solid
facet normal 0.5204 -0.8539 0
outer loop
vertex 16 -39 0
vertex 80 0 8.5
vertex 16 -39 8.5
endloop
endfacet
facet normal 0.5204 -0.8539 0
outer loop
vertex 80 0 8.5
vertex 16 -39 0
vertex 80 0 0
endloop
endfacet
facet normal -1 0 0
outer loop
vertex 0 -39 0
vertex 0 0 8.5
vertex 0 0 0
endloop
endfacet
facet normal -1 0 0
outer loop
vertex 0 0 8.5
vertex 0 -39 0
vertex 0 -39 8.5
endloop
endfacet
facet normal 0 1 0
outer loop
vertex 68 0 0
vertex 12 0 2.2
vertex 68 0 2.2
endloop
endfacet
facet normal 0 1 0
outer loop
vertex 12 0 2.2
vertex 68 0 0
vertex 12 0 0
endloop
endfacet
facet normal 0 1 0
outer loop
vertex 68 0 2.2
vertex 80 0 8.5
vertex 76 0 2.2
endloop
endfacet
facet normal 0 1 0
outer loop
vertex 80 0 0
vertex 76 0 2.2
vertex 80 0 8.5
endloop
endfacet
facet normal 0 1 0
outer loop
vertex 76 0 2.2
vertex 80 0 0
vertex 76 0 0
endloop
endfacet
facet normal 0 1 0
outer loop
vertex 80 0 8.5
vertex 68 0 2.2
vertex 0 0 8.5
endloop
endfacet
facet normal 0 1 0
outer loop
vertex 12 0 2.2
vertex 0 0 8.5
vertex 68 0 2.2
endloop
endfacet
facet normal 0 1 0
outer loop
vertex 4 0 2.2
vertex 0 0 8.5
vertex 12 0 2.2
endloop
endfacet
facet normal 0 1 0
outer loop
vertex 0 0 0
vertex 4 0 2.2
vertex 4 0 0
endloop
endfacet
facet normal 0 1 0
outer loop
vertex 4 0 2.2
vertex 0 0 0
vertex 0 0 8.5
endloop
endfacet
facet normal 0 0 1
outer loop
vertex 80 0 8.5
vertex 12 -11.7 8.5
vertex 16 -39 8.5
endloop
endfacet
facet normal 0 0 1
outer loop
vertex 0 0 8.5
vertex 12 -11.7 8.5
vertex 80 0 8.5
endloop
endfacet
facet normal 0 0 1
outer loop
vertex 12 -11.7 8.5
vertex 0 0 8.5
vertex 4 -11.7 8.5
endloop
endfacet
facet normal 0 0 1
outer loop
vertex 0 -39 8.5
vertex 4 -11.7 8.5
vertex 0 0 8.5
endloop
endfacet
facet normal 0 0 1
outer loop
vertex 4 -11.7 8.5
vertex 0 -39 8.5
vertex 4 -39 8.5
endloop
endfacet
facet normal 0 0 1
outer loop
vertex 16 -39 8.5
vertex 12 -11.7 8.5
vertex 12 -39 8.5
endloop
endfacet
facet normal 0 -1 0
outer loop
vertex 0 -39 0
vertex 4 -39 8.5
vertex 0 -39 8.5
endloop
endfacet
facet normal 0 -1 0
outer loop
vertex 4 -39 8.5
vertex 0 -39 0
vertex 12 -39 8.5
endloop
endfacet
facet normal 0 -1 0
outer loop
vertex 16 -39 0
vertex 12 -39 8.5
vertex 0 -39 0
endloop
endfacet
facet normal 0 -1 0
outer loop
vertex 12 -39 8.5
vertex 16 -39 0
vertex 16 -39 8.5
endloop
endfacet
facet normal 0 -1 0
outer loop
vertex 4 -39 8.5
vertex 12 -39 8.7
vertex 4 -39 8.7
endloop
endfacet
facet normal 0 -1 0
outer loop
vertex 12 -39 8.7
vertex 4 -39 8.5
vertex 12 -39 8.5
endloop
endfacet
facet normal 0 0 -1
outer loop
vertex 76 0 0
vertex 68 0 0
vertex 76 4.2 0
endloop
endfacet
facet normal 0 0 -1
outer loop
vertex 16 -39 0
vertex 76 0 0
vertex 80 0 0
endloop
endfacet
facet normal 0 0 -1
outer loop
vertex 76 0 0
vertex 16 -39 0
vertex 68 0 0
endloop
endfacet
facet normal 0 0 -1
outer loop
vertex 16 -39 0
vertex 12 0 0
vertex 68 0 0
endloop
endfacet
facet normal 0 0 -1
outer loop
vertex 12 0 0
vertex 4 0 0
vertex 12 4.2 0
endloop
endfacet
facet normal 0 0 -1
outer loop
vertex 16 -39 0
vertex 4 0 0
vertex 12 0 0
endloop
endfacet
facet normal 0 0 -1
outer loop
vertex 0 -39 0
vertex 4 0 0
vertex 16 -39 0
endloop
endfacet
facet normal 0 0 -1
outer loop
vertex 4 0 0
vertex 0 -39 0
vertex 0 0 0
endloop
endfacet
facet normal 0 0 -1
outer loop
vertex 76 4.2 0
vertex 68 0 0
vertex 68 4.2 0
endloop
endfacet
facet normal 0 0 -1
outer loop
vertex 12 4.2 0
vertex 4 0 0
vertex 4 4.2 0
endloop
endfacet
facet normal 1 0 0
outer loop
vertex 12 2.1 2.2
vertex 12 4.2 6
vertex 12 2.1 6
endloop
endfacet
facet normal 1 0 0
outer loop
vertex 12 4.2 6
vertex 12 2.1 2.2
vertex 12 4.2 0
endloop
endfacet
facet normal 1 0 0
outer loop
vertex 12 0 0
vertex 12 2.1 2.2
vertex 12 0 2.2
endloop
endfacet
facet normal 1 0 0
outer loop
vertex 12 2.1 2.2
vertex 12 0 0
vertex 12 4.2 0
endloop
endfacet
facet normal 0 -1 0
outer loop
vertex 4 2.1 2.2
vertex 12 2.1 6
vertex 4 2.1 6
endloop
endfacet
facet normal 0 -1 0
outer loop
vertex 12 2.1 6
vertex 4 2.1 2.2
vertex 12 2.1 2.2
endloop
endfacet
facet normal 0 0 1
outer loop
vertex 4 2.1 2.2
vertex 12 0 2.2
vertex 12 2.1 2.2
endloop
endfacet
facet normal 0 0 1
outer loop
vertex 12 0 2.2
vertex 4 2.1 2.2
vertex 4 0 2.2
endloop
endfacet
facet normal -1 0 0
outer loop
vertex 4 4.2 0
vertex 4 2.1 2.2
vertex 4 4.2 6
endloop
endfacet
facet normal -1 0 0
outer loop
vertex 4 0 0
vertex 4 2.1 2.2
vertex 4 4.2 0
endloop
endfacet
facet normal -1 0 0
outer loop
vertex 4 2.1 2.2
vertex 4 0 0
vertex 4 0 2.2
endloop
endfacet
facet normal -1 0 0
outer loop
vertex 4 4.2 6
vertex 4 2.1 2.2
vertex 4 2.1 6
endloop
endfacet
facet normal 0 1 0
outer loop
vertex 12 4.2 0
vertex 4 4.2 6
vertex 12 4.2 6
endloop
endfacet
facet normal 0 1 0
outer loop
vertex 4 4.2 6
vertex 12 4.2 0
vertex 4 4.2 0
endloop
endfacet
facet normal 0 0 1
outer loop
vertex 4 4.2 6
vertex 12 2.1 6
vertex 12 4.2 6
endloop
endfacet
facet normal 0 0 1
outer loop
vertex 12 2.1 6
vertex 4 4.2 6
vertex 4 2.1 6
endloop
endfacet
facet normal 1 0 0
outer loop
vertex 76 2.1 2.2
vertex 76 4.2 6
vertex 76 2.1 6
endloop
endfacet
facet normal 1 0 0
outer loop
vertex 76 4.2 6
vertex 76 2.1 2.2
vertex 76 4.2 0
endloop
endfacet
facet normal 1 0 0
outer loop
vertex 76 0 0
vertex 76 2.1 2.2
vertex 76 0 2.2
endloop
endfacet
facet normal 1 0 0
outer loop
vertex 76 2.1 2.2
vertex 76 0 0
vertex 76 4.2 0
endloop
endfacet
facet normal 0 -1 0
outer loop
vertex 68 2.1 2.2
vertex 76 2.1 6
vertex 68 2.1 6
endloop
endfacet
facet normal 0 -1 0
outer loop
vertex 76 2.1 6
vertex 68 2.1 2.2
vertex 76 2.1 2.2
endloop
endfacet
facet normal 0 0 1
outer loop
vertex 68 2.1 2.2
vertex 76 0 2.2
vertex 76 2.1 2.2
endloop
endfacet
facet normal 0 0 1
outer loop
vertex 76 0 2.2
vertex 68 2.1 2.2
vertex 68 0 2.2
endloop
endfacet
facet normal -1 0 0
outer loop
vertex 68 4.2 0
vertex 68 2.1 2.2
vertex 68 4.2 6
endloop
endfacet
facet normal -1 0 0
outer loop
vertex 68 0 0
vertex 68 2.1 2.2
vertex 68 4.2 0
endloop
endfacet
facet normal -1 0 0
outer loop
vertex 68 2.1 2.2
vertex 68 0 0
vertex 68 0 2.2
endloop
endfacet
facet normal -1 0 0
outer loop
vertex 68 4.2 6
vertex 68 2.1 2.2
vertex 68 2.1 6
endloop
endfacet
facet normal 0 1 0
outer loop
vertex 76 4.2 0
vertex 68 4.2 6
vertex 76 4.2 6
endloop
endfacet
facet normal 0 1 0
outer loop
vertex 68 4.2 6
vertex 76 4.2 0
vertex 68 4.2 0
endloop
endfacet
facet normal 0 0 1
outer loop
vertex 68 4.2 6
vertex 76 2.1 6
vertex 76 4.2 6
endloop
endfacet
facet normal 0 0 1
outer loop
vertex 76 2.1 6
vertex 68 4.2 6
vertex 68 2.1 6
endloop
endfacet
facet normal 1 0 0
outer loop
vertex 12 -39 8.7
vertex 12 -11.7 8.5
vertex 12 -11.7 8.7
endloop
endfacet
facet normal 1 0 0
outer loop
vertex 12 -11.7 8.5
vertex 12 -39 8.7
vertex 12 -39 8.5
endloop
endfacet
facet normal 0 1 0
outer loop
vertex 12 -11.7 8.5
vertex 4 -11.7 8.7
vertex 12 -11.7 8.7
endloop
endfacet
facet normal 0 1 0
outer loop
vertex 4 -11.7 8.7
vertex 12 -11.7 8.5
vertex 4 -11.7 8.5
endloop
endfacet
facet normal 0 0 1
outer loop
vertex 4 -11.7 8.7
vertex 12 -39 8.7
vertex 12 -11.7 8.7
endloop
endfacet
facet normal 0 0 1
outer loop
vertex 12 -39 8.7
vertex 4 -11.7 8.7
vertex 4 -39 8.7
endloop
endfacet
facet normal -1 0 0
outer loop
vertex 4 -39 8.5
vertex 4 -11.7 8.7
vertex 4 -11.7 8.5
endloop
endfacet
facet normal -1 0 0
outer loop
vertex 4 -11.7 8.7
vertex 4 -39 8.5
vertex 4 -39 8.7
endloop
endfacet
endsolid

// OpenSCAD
// file: short-curve-start-right.scad
// kerb

kerb_length = 80; // mm
kerb_width = 39; // mm
kerb_height = 8.5; // mm
kerb_angle = 0.2; // %

linear_extrude(kerb_height) polygon([
    [0, 0], 
    [kerb_length, 0], 
    [kerb_length * kerb_angle, kerb_width], 
    [0, kerb_width]
]);

// hooks

hook_width = 8; // mm
hook_bend_height = 2.2; // mm
hook_bend_length = 2.1; // mm
hook_barb_height = 6; // mm
hook_barb_length = 1; // mm

linear_extrude(hook_bend_height) polygon([
    [0.05*kerb_length, 0], 
    [0.05*kerb_length + hook_width, 0], 
    [0.05*kerb_length + hook_width, -hook_bend_length], 
    [0.05*kerb_length, -hook_bend_length]
]);


linear_extrude(hook_barb_height) polygon([
    [0.05*kerb_length, -hook_bend_length], 
    [0.05*kerb_length + hook_width, -hook_bend_length], 
    [0.05*kerb_length + hook_width, -hook_bend_length-hook_bend_length], 
    [0.05*kerb_length, -hook_bend_length-hook_bend_length]
]);

linear_extrude(hook_bend_height) polygon([
    [0.95*kerb_length - hook_width, 0], 
    [0.95*kerb_length, 0], 
    [0.95*kerb_length, -hook_bend_length], 
    [0.95*kerb_length - hook_width, -hook_bend_length]
]);


linear_extrude(hook_barb_height) polygon([
    [0.95*kerb_length - hook_width, -hook_bend_length], 
    [0.95*kerb_length, -hook_bend_length], 
    [0.95*kerb_length, -hook_bend_length-hook_bend_length], 
    [0.95*kerb_length - hook_width, -hook_bend_length-hook_bend_length]
]);

// strips

strip_count = 1; // #
strip_width = 0.5; // %
strip_length = 0.7; // %
strip_height = 0.2; // mm

for(i = [0 : strip_count - 1]) {
    strip_size = strip_width * kerb_length * kerb_angle / strip_count;
    strip_offset = i * kerb_length * kerb_angle / strip_count + (1-strip_width) * kerb_length * kerb_angle / (2 * strip_count);

    linear_extrude(kerb_height + strip_height) polygon([
        [strip_offset, kerb_width],
        [strip_offset + strip_size, kerb_width],
        [strip_offset + strip_size, (1-strip_length) * kerb_width],
        [strip_offset, (1-strip_length) * kerb_width]
    ]);
}
// main file
mirror(v= [0, 1, 0] ) {
    include <short-curve-start-right.scad>
}
